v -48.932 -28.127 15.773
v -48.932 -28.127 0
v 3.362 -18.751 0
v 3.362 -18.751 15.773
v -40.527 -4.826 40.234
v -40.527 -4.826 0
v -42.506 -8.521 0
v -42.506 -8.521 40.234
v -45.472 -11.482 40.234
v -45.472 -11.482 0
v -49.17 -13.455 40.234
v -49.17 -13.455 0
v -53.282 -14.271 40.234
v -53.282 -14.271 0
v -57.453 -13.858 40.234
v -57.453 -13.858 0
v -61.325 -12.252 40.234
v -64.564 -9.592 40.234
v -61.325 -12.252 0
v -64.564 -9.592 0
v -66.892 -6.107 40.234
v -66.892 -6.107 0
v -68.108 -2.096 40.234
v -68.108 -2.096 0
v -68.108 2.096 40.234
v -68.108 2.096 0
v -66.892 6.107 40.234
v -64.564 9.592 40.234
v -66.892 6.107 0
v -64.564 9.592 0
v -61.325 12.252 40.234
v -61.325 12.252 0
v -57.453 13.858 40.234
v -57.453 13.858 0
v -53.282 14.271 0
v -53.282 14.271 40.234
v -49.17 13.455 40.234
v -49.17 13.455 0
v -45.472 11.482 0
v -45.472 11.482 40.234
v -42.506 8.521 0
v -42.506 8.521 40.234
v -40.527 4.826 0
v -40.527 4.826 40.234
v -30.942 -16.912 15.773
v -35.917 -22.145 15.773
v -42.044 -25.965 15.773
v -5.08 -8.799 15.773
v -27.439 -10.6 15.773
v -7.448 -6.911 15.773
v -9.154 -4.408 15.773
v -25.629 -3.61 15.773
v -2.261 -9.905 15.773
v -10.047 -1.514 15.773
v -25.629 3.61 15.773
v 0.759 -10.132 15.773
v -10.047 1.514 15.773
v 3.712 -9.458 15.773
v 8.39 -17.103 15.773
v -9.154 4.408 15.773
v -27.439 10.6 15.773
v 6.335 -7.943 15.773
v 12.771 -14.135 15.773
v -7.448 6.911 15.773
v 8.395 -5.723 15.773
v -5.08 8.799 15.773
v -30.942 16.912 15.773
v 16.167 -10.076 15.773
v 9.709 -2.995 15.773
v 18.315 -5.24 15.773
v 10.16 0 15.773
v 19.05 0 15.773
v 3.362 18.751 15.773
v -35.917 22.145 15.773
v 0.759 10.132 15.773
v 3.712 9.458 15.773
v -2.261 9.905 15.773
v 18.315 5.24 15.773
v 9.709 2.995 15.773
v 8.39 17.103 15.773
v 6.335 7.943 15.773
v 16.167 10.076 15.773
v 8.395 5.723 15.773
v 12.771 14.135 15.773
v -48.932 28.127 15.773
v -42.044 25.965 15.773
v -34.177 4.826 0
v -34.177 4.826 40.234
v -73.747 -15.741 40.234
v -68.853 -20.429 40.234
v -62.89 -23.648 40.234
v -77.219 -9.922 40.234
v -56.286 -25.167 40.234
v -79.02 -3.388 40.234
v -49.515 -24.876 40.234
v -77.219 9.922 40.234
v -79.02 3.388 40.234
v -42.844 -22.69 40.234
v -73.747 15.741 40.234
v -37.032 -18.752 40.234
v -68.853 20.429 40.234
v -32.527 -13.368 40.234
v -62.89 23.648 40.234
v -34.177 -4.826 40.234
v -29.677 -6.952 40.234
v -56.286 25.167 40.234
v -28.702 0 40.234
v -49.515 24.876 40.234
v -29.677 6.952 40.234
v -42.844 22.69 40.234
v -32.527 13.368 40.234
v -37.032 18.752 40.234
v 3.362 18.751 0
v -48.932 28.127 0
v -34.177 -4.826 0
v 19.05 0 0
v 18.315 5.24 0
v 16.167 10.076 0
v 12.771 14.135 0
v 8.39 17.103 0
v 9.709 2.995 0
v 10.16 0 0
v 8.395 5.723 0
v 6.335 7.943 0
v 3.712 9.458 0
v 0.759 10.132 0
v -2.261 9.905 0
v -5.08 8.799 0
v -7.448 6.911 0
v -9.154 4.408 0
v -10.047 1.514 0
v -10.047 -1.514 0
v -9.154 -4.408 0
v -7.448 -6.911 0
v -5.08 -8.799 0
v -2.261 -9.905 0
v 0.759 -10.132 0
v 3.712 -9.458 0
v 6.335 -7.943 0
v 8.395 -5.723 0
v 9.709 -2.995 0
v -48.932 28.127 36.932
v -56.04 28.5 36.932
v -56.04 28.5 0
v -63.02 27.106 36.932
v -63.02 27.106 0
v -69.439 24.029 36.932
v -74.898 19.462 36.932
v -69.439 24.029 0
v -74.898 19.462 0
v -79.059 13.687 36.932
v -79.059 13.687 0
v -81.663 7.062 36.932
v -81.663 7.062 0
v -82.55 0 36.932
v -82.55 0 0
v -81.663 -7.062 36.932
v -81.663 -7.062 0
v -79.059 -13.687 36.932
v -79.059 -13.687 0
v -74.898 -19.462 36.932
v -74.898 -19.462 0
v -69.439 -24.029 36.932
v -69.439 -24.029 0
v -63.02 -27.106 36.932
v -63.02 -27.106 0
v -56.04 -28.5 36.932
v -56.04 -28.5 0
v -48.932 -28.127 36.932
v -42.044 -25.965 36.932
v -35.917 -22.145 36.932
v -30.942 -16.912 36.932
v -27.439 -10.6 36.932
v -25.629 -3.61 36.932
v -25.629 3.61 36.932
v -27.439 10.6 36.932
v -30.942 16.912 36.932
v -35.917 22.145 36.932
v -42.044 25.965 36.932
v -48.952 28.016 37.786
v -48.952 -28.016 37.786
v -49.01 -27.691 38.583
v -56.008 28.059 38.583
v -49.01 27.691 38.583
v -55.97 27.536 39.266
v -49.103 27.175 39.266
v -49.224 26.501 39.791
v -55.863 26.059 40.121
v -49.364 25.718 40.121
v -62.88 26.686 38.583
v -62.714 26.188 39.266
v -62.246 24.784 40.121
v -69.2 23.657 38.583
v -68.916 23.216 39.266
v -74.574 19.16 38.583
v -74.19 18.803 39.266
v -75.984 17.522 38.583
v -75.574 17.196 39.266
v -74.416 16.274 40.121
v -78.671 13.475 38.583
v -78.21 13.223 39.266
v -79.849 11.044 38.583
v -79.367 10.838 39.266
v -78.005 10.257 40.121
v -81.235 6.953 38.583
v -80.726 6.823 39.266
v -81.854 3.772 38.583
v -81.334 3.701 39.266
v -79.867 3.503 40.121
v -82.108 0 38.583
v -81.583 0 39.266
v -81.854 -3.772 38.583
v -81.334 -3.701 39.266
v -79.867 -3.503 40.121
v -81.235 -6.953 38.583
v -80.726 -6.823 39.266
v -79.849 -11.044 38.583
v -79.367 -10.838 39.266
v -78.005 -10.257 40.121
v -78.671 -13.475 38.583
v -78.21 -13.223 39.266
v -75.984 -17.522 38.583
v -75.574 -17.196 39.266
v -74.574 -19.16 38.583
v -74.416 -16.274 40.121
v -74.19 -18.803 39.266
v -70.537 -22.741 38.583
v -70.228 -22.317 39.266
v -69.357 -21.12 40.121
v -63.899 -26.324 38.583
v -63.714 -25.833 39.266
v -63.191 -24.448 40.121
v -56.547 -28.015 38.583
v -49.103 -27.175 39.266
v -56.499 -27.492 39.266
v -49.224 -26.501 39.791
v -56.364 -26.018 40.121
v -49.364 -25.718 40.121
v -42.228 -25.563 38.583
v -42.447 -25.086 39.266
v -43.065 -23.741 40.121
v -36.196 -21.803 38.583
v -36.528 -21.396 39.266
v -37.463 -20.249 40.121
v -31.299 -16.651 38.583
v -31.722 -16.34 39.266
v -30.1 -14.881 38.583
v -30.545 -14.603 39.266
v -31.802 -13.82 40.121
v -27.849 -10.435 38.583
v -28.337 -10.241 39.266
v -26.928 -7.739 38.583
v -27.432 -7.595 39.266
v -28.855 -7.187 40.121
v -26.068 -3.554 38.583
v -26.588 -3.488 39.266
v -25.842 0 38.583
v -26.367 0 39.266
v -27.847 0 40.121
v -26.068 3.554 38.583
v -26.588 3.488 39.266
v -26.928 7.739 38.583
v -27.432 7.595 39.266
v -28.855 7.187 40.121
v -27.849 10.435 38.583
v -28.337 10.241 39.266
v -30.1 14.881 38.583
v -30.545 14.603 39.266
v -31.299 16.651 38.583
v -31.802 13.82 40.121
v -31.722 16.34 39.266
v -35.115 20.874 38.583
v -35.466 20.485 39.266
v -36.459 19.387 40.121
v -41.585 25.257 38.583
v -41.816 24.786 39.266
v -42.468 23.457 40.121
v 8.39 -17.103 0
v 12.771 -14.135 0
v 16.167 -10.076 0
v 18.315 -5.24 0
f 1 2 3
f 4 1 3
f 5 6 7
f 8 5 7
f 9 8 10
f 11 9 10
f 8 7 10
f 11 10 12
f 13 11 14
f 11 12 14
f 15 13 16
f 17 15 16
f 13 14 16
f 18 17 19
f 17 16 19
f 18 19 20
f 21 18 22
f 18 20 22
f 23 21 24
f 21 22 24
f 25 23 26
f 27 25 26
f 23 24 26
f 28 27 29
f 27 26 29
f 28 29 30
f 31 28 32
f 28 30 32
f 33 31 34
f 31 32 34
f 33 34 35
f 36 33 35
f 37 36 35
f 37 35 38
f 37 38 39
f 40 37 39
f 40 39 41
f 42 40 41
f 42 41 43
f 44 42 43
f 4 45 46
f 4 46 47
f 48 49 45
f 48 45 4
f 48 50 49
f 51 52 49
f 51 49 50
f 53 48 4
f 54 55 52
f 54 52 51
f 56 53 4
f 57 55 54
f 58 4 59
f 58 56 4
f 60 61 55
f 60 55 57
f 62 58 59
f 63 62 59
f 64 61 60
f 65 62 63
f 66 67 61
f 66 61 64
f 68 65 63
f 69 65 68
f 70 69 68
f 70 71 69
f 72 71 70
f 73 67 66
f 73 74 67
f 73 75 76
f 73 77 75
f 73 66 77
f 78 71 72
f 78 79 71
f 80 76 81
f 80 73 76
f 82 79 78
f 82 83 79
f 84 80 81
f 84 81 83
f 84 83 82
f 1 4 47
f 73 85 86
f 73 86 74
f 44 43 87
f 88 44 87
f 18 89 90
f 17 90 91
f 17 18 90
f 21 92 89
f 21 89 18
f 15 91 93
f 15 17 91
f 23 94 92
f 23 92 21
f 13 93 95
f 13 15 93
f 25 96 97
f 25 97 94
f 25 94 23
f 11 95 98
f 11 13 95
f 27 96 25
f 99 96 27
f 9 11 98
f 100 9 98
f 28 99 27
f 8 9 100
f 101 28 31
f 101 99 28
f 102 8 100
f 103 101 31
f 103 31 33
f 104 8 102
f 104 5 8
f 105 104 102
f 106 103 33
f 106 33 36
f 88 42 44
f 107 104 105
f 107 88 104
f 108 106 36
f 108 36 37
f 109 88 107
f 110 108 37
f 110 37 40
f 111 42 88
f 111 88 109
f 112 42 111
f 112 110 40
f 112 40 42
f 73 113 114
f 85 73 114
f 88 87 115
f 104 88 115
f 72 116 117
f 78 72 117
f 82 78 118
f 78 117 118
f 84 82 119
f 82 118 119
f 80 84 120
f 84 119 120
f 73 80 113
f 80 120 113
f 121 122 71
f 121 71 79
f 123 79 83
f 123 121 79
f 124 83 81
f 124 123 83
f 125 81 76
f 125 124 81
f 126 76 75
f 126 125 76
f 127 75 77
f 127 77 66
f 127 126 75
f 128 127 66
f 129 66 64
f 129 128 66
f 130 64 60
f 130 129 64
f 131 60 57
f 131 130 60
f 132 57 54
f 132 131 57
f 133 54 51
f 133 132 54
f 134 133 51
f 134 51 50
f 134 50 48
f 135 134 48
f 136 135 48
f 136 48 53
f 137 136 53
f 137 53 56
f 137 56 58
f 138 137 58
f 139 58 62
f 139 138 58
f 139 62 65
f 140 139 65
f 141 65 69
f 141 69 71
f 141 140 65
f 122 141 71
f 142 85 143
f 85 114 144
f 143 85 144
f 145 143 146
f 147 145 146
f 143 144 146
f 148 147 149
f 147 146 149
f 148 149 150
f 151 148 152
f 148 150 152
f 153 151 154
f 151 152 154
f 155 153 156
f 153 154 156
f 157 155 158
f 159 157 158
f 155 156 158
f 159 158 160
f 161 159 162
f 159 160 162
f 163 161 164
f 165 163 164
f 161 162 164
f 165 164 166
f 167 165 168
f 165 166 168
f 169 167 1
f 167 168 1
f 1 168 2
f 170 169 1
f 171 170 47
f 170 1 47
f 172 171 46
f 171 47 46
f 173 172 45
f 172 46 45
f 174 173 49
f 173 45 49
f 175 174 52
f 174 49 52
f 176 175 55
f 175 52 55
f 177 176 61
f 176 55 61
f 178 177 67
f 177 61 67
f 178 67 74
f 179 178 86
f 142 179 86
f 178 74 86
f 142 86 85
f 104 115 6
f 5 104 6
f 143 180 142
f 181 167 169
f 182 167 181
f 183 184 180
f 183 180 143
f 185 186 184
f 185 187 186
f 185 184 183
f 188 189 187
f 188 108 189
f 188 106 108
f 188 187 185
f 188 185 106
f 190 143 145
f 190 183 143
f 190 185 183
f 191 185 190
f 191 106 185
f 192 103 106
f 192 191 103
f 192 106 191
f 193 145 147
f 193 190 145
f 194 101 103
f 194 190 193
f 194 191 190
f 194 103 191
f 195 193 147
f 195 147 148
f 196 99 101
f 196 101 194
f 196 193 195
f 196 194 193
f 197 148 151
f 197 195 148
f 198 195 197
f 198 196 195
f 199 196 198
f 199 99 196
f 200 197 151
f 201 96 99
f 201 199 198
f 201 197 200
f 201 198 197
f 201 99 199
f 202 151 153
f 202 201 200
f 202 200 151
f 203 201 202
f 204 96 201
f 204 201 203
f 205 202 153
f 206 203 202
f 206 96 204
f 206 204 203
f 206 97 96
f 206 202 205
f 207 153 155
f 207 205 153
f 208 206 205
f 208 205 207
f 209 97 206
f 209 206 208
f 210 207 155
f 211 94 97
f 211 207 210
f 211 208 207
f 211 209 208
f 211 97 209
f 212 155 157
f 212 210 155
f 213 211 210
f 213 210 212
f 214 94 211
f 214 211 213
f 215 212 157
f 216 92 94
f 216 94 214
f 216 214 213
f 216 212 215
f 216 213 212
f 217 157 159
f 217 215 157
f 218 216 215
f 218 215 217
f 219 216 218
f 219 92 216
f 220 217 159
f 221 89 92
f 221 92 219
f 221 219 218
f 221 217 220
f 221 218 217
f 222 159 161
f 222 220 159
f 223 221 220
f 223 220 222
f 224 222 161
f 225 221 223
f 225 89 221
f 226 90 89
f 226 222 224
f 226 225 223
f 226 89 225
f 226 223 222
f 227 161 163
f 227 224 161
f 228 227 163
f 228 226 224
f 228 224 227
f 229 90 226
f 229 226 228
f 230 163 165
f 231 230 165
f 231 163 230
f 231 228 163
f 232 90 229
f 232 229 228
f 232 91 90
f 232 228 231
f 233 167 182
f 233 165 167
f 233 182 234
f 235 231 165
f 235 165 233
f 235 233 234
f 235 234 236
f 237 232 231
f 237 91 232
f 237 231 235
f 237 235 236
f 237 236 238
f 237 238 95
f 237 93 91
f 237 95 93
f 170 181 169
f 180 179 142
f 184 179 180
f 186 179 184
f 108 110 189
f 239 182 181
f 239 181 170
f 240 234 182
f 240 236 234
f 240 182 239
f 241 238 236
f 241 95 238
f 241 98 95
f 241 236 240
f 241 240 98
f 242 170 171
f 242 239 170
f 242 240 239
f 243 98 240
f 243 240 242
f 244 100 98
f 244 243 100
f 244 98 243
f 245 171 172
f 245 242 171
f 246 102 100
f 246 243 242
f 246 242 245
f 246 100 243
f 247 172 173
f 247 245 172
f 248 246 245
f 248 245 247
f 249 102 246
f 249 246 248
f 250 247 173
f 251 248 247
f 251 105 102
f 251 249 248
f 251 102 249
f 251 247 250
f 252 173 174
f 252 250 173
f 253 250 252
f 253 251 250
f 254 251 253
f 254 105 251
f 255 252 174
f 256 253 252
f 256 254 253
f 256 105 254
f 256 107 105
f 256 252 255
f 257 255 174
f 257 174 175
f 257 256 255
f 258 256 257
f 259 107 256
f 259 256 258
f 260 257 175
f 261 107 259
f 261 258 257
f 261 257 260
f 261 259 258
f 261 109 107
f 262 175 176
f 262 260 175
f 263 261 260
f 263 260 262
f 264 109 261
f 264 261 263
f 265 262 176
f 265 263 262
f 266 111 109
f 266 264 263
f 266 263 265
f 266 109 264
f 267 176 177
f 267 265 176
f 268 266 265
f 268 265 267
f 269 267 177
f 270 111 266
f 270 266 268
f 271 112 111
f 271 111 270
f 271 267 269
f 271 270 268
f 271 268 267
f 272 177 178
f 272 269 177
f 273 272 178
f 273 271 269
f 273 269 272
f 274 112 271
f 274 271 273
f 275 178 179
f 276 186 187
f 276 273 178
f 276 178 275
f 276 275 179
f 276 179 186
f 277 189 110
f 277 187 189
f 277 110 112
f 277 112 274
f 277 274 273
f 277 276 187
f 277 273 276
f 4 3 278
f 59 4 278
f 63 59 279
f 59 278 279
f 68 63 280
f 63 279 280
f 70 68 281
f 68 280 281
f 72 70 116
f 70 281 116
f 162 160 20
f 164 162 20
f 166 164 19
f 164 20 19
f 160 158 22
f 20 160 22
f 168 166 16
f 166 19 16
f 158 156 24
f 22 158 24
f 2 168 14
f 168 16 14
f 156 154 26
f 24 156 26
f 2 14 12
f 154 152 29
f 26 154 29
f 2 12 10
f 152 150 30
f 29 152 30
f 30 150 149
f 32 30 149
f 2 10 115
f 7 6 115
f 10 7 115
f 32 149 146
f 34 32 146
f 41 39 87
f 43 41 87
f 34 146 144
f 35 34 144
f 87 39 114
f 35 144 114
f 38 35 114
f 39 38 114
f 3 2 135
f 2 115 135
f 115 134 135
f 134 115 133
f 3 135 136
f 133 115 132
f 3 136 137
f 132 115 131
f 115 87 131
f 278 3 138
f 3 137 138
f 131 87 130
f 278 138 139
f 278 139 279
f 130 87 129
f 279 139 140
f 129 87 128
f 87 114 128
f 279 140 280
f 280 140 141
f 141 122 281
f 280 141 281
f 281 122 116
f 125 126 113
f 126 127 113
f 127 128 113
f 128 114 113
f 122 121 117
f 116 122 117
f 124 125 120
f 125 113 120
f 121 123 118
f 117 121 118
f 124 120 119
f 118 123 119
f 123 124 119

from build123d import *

# Parameters (mm, degrees)
F1_DEPTH = 40.2336
F0_R     = 10.16
F2_DEPTH = 15.7734
F3_R     = 3.302


# Not quite as in the source:
# - a feature names something its author has since deleted; it is built from what else it names


with BuildPart() as f1:
    # F0 (on Top) → F1 (new body)
    with BuildSketch(Plane.XY):
        with BuildLine():
            ThreePointArc((-48.9323529412, -28.1265414802), (-32.0589754437, -18.3362616868), (-25.4, 0))
            ThreePointArc((-25.4, 0), (-32.0589754437, 18.3362616868), (-48.9323529412, 28.1265414802))
            ThreePointArc((-48.9323529412, 28.1265414802), (-82.55, 0), (-48.9323529412, -28.1265414802))
        make_face()
        with BuildLine():
            ThreePointArc((-40.5272351207, -4.826), (-68.2625, 0), (-40.5272351207, 4.826))
            Line((-40.5272351207, 4.826), (-34.1772351207, 4.826))
            Line((-34.1772351207, 4.826), (-34.1772351207, -4.826))
            Line((-34.1772351207, -4.826), (-40.5272351207, -4.826))
        make_face(mode=Mode.SUBTRACT)
    extrude(amount=F1_DEPTH)

    # F0 (on Top) → F2 (join)
    with BuildSketch(Plane.XY):
        with BuildLine():
            ThreePointArc((-48.9323529412, 28.1265414802), (-32.0589754437, 18.3362616868), (-25.4, 0))
            ThreePointArc((-25.4, 0), (-32.0589754437, -18.3362616868), (-48.9323529412, -28.1265414802))
            Line((-48.9323529412, -28.1265414802), (3.3617647059, -18.7510276535))
            ThreePointArc((3.3617647059, -18.7510276535), (-19.05, 0), (3.3617647059, 18.7510276535))
            Line((3.3617647059, 18.7510276535), (-48.9323529412, 28.1265414802))
        make_face()
        with BuildLine():
            ThreePointArc((19.05, 0), (14.6106830375, 12.2241744579), (3.3617647059, 18.7510276535))
            ThreePointArc((3.3617647059, 18.7510276535), (-19.05, 0), (3.3617647059, -18.7510276535))
            ThreePointArc((3.3617647059, -18.7510276535), (14.6106830375, -12.2241744579), (19.05, 0))
        make_face()
        Circle(F0_R, mode=Mode.SUBTRACT)
    extrude(amount=F2_DEPTH)

    # F3
    f3_edges = [f1.edges().sort_by_distance(p)[0] for p in [
        (-59.017647, 28.126541, 40.2336),
    ]]
    fillet(f3_edges, radius=F3_R)


solid = f1.part
